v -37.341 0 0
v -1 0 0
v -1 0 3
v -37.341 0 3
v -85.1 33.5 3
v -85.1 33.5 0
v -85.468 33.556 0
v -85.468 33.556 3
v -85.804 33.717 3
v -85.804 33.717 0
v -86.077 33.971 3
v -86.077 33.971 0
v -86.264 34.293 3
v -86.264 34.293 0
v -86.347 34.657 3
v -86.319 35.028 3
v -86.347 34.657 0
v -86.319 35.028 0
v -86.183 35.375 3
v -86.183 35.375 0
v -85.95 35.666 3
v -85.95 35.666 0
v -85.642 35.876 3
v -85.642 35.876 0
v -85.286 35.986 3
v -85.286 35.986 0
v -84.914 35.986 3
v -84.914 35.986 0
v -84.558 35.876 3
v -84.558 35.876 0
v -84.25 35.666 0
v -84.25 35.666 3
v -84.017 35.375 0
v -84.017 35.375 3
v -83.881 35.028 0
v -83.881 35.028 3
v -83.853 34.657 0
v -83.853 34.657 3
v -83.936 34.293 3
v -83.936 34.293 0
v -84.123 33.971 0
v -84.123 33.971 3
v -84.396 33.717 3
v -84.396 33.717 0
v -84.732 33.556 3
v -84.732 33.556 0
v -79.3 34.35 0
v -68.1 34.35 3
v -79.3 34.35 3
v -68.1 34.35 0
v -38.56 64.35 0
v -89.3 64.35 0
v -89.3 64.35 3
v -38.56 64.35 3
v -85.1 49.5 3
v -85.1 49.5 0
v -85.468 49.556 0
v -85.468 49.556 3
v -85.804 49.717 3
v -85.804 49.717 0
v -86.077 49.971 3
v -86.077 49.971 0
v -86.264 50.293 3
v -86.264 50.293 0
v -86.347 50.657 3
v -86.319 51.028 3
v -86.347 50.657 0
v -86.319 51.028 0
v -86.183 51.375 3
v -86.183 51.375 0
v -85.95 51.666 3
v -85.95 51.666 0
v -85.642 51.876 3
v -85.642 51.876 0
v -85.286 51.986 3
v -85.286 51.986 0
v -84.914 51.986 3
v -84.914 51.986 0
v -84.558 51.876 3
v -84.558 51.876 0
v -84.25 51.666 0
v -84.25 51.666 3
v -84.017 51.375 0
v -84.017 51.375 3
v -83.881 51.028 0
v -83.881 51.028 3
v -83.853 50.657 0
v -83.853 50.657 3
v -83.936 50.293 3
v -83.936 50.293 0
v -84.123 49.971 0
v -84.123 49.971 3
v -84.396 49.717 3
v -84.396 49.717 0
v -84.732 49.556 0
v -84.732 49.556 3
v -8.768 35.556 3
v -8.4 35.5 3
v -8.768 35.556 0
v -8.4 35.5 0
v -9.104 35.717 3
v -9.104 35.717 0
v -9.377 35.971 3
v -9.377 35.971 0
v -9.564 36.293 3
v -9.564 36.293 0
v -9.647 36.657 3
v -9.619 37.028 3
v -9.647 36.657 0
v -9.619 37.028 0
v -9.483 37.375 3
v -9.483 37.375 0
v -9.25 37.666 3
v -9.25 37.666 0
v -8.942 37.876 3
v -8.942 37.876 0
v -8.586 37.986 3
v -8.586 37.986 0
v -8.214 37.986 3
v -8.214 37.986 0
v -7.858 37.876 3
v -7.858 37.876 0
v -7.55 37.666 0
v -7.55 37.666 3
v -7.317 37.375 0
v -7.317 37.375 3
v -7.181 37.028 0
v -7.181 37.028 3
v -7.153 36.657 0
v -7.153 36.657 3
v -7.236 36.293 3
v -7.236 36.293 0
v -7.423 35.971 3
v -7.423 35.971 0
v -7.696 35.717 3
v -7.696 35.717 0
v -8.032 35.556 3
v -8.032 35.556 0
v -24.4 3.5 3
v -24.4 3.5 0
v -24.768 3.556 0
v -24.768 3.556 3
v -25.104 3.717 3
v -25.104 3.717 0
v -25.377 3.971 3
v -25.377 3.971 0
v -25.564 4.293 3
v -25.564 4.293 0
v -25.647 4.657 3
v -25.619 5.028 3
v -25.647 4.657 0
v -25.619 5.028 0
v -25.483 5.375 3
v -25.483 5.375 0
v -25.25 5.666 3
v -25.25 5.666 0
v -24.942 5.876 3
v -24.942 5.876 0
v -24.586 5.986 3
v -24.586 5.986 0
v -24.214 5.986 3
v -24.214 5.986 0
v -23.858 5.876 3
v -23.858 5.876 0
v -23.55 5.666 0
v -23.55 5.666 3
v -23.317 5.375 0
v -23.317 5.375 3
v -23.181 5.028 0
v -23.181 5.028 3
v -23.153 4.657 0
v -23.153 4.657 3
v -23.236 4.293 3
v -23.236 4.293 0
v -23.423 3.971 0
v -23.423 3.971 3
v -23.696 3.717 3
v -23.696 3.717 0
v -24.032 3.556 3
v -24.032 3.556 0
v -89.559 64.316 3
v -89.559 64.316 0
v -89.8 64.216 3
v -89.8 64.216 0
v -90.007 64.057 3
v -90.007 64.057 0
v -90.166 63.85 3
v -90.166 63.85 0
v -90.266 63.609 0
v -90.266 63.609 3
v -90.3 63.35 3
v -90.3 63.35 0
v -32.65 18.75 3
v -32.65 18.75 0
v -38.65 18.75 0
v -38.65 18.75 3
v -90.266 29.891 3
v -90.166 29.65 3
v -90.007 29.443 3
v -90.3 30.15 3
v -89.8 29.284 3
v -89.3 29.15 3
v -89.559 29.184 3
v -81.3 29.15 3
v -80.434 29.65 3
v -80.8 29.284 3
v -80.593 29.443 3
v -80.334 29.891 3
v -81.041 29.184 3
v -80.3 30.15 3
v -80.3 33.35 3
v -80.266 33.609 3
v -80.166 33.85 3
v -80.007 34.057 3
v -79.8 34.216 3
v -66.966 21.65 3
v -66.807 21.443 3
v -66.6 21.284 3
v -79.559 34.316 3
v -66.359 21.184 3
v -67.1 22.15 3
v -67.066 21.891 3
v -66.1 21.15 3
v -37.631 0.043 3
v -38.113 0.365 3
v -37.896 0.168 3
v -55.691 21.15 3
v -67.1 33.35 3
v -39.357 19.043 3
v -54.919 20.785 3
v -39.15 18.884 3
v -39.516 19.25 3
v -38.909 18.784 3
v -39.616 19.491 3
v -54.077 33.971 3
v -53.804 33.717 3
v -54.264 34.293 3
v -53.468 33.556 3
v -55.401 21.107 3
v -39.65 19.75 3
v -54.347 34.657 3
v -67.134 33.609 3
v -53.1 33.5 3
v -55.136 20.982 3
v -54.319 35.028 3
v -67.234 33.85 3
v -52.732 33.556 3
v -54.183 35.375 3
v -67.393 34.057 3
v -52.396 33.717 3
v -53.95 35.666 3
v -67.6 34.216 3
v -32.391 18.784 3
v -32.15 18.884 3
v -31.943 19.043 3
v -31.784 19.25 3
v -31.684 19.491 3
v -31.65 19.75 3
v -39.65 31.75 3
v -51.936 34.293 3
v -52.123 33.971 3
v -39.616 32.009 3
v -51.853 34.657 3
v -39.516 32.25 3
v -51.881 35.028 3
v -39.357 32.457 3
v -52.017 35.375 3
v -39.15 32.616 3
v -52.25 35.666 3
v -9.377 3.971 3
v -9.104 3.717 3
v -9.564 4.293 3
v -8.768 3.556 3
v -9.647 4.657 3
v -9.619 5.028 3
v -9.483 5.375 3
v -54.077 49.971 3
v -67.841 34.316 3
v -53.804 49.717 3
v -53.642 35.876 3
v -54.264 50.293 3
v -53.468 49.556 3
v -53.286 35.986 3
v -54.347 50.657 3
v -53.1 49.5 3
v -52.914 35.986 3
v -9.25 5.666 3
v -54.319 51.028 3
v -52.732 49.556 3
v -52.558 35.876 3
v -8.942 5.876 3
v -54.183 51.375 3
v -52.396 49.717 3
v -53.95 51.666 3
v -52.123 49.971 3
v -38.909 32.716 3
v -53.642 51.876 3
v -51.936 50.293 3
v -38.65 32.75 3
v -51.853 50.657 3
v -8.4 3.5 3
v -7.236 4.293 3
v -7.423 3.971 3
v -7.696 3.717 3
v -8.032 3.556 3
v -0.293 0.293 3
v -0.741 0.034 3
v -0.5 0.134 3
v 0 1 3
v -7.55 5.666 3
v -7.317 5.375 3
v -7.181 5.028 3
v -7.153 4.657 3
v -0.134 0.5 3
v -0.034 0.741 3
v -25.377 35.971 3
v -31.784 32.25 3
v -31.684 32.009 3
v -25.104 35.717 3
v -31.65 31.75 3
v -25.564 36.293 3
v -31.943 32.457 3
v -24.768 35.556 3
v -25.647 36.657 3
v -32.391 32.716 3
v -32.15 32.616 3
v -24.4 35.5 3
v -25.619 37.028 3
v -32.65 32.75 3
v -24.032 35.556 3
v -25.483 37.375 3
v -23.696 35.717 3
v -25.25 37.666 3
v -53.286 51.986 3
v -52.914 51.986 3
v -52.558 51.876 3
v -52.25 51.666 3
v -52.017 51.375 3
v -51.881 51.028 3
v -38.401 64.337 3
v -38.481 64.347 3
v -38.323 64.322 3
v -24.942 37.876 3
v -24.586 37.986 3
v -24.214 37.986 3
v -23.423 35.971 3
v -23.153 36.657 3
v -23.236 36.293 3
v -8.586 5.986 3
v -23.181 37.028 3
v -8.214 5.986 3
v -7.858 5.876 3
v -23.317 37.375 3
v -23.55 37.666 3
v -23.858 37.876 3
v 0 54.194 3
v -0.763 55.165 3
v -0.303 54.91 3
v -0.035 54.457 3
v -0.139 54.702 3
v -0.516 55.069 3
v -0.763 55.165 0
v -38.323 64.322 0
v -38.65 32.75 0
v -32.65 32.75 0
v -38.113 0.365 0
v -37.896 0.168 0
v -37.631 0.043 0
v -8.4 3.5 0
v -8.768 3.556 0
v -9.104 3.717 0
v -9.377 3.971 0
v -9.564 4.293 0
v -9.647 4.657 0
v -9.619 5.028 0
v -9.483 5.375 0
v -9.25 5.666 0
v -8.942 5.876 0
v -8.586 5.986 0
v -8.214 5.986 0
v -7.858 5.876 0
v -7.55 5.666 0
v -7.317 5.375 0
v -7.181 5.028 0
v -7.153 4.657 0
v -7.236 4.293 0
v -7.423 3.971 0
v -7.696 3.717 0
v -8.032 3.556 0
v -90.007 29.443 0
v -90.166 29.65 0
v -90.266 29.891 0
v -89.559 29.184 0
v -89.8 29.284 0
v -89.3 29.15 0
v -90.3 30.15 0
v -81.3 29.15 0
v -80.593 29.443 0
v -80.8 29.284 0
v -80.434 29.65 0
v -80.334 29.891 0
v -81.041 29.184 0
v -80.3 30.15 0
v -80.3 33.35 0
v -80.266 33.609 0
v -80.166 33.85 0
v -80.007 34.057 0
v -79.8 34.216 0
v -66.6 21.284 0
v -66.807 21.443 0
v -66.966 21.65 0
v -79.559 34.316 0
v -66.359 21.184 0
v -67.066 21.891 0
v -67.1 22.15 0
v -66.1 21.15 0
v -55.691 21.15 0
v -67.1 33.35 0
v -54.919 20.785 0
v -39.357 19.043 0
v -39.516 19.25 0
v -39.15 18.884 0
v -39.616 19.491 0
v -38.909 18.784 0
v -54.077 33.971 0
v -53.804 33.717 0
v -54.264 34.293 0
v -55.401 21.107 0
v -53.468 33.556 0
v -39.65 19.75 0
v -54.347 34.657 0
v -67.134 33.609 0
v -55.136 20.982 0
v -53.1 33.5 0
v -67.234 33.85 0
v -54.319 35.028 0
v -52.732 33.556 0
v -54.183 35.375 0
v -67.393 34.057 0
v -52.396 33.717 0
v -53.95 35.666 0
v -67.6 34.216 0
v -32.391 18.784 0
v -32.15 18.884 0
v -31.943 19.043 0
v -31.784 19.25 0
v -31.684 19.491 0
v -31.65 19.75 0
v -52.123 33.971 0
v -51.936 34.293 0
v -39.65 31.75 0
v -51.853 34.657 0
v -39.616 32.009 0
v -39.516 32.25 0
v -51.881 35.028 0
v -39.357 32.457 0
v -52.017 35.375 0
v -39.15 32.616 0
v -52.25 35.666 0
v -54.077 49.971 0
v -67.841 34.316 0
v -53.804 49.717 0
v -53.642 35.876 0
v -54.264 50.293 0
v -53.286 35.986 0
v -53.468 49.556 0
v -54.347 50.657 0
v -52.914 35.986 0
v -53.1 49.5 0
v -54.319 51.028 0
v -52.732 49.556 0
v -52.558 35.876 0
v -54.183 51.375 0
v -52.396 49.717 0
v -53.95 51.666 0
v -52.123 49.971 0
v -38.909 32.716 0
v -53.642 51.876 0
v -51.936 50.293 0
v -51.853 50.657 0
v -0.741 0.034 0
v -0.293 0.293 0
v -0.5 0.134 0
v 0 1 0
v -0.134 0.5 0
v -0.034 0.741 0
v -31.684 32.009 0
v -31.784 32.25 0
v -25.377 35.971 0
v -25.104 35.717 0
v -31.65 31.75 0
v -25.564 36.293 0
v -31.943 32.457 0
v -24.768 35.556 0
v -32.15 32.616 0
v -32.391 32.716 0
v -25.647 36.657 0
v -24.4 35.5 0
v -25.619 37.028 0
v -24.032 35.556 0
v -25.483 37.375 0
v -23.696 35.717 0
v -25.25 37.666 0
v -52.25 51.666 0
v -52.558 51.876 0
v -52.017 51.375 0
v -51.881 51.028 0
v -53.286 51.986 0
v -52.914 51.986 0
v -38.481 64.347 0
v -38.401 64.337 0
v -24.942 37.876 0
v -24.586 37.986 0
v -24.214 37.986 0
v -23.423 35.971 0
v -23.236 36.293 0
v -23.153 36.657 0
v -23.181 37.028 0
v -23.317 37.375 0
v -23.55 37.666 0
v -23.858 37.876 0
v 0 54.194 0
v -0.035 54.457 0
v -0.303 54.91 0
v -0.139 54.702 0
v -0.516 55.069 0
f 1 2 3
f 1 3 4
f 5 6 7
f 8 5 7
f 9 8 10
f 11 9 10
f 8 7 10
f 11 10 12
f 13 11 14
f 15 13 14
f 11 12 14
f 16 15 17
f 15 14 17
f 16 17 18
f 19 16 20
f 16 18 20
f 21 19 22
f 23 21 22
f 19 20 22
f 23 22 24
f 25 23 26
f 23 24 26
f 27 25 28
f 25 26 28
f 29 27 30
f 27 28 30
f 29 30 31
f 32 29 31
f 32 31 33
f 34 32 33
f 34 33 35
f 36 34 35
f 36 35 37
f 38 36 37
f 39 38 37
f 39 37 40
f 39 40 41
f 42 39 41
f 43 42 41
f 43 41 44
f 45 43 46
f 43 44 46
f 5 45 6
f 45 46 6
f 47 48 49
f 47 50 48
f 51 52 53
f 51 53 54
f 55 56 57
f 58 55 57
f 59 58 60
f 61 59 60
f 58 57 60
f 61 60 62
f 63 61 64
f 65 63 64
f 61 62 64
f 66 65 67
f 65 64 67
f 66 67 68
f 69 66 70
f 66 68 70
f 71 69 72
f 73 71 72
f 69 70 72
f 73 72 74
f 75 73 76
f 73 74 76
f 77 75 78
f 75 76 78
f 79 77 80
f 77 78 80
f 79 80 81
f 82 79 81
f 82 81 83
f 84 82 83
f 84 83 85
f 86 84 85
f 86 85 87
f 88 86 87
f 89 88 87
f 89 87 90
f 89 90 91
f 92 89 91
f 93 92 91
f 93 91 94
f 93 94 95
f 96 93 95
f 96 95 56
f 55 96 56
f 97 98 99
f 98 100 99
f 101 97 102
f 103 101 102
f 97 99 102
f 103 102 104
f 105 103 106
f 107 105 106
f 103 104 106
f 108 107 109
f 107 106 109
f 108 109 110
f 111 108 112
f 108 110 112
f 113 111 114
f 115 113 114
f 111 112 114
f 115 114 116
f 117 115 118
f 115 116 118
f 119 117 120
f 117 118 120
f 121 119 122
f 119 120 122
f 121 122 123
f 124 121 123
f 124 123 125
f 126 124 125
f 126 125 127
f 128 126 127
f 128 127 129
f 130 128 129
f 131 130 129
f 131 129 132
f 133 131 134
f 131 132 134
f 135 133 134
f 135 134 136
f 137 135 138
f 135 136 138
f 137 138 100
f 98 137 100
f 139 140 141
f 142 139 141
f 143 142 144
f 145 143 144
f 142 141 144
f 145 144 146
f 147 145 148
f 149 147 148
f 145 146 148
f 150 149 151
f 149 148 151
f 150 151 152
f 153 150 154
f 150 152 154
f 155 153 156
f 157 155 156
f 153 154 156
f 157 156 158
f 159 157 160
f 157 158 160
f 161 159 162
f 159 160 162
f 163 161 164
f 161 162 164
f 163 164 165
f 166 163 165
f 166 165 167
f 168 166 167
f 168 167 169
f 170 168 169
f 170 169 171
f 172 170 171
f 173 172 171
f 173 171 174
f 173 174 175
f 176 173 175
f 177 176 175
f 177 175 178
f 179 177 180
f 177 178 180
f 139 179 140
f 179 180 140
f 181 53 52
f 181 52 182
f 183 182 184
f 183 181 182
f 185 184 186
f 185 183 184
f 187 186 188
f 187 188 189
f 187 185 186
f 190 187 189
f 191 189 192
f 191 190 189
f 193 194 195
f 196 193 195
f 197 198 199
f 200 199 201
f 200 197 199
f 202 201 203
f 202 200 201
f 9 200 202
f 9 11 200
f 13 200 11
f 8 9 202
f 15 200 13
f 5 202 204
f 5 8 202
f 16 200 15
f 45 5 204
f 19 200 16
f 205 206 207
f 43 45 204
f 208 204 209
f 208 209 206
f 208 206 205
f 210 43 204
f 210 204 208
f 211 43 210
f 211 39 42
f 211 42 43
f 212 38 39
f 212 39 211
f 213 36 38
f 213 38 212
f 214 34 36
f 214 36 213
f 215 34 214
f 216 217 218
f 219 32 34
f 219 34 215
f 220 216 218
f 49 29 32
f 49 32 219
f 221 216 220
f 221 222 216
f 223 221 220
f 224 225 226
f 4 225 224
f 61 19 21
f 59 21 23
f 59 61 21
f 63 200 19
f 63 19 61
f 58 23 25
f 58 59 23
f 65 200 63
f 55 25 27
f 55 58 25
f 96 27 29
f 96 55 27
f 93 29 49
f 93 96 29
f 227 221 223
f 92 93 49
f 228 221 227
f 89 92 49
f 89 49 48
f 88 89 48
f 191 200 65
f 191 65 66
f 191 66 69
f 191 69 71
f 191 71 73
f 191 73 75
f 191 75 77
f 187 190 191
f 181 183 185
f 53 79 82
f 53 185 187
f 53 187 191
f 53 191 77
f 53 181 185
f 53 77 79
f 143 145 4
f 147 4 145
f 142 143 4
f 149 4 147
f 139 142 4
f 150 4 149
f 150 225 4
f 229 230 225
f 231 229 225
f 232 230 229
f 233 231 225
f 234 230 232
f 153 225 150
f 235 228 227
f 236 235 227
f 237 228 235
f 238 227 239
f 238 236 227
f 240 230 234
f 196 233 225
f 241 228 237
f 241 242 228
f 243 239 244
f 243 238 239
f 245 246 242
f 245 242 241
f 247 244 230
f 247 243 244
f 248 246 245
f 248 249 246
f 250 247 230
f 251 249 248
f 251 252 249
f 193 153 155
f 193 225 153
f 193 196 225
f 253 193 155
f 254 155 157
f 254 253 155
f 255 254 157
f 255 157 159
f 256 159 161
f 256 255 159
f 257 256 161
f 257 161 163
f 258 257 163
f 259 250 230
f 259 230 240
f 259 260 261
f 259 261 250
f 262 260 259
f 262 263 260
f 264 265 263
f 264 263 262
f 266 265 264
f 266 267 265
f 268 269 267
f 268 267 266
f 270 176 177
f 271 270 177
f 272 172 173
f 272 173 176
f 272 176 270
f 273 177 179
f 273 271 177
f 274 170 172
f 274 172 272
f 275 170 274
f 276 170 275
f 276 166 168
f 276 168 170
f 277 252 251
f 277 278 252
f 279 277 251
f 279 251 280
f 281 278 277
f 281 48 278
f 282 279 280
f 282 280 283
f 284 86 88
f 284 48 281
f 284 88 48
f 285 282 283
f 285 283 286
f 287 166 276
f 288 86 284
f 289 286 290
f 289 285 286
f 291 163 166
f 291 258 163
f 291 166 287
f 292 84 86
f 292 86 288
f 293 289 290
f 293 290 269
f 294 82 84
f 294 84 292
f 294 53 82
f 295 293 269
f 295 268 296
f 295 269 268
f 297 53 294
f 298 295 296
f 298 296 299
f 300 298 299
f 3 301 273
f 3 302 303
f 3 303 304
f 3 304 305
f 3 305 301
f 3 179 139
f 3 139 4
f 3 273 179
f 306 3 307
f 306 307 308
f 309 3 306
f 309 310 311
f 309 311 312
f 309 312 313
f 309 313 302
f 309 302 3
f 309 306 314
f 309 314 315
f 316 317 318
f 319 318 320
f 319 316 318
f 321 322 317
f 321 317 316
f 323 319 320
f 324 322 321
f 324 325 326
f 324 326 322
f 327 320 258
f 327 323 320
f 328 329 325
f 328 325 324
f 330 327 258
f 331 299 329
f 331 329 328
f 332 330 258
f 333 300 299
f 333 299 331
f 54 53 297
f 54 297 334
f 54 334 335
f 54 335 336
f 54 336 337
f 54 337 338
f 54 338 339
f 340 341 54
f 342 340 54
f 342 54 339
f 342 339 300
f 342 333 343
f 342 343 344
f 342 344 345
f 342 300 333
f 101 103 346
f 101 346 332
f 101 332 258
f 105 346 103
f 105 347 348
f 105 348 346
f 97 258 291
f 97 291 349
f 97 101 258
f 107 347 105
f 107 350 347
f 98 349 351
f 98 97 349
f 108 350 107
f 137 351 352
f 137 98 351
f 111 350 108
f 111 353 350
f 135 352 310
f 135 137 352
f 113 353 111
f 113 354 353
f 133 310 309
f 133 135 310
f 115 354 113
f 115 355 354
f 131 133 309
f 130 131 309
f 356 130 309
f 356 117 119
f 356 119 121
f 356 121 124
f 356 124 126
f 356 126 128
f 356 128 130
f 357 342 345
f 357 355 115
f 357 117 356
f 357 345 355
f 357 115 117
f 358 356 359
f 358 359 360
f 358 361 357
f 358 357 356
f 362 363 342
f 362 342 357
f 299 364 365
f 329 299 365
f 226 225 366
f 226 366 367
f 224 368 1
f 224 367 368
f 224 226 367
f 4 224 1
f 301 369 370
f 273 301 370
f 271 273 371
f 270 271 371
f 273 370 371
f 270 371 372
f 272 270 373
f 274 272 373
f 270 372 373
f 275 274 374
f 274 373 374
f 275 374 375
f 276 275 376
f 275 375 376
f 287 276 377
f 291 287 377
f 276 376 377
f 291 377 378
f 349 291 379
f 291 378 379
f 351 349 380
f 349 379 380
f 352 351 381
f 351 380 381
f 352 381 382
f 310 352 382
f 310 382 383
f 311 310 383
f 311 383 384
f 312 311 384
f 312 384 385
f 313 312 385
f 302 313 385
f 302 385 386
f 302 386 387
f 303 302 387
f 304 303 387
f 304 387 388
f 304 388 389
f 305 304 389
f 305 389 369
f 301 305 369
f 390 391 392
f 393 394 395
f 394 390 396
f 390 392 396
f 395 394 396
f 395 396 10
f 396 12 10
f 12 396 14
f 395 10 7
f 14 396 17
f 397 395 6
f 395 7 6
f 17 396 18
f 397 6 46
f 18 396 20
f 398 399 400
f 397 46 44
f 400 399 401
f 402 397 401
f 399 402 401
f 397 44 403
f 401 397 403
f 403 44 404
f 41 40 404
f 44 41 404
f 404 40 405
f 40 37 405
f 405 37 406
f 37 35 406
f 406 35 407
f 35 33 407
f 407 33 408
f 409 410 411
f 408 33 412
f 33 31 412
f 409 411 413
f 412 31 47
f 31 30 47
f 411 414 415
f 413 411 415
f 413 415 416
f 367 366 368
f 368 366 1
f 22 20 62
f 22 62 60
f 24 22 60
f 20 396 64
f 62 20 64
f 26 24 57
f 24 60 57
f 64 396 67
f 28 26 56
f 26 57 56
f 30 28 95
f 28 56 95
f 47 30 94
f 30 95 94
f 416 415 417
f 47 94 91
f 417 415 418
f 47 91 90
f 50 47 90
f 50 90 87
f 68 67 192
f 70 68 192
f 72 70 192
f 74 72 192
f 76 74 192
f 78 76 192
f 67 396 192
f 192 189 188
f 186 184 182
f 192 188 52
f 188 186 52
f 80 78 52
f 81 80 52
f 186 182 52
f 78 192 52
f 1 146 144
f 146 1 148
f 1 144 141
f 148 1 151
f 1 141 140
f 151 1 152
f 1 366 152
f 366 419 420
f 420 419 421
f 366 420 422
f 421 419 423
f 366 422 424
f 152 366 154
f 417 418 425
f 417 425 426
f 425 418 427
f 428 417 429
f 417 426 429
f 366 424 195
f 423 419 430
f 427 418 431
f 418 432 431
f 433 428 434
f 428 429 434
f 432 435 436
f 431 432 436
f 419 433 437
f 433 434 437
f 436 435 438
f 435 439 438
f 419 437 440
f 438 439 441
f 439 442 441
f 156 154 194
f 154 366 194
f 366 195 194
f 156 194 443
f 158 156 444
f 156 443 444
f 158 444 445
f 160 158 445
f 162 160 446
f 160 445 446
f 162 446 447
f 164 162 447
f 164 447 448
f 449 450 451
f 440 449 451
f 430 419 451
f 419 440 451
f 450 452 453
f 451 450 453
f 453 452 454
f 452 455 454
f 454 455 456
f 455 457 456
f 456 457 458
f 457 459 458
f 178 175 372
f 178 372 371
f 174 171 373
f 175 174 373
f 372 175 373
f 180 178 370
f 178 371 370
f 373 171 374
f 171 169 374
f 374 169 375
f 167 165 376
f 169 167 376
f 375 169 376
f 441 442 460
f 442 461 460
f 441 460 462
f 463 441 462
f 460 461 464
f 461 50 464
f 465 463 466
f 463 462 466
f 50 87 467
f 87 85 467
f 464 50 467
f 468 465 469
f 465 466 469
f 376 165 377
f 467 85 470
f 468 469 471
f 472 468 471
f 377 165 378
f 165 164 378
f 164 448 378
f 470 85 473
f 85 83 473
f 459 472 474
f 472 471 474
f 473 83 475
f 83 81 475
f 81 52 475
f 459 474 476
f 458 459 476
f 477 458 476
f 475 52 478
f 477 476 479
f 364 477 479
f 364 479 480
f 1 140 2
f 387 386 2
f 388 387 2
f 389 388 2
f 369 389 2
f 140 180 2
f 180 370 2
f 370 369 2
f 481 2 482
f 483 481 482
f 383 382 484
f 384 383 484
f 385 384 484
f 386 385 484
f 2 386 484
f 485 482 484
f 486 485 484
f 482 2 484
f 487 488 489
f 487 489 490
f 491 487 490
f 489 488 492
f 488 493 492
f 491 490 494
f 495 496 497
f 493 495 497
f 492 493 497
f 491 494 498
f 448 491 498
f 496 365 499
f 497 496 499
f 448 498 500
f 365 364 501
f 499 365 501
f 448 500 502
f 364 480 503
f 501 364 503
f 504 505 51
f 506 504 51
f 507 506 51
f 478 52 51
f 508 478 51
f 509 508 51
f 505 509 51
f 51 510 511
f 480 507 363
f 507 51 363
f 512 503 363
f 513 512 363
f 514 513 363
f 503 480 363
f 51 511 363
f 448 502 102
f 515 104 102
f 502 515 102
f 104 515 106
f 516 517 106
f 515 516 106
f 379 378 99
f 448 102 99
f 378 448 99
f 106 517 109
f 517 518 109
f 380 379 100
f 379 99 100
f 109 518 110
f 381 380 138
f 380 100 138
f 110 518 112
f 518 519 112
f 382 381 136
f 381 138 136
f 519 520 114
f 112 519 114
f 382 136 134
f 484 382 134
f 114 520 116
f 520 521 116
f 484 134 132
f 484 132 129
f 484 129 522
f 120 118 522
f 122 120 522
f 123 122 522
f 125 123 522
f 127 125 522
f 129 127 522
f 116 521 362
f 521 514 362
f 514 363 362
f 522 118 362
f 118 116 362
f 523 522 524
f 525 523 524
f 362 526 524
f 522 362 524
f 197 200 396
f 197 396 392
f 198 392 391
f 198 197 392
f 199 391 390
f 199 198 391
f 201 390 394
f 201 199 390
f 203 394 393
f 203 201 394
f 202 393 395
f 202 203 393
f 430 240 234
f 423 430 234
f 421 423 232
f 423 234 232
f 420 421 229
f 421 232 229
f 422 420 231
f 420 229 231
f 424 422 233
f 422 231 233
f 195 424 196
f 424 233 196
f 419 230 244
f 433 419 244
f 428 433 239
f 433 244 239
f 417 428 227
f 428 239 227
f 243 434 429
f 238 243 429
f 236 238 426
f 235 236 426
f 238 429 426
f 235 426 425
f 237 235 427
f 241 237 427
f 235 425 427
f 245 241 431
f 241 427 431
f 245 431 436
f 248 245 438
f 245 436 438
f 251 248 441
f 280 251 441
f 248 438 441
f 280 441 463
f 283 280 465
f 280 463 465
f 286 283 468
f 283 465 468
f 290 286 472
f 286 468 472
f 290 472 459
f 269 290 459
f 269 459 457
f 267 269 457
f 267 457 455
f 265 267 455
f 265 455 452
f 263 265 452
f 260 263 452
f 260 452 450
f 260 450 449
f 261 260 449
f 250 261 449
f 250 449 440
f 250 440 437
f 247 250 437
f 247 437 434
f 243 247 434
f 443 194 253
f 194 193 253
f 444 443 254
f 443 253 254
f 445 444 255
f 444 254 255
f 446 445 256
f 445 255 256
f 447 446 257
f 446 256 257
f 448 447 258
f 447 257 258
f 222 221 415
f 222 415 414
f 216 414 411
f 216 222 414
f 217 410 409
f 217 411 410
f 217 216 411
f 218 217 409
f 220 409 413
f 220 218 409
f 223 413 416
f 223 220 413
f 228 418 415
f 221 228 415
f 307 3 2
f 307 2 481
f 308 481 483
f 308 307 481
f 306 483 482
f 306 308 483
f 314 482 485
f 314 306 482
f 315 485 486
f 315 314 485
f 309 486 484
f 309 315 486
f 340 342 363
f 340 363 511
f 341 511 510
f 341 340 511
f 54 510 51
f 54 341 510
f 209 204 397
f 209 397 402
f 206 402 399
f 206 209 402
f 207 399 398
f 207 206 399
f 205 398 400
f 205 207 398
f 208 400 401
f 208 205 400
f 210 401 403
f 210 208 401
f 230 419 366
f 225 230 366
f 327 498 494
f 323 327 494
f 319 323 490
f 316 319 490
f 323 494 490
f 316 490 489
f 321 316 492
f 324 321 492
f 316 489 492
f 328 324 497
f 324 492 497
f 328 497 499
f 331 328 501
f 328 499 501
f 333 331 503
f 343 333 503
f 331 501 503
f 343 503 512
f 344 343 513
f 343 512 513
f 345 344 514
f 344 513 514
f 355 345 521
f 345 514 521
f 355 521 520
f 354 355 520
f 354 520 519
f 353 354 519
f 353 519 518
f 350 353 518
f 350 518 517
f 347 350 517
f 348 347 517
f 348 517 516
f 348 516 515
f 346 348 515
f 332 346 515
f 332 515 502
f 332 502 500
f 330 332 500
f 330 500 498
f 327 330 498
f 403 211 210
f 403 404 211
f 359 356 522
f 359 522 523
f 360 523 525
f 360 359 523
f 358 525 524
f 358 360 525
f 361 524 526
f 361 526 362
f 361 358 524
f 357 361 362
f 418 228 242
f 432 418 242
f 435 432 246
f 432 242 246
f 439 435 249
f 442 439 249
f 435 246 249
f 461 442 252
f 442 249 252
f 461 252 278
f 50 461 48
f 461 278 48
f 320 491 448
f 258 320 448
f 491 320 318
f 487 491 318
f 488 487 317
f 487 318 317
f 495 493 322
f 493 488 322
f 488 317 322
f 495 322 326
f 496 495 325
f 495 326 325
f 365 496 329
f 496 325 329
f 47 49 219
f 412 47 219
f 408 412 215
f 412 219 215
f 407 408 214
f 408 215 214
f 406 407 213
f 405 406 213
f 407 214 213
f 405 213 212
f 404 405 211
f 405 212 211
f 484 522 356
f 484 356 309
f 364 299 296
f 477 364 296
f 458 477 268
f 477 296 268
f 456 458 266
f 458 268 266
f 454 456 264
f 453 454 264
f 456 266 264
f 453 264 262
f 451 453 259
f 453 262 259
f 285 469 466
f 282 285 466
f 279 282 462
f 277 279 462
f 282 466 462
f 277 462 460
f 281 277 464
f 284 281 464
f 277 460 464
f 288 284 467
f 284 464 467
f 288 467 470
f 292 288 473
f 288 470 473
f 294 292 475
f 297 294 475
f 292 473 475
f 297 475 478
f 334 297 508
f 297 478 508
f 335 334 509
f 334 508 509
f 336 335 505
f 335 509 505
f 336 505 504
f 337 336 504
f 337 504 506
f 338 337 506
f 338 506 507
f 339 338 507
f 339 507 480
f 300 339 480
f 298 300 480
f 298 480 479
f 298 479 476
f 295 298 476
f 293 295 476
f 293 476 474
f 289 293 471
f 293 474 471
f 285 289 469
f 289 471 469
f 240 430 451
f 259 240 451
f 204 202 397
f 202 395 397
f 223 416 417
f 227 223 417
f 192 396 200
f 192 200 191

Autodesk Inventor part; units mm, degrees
ref_plane "YZ Plane" through (0, 0, 0) normal (1, 0, 0) x (0, 1, 0)
ref_plane "XZ Plane" through (0, 0, 0) normal (0, 1, 0) x (-1, 0, 0)
ref_plane "XY Plane" through (0, 0, 0) normal (0, 0, 1) x (1, 0, 0)
sketch "スケッチ1" plane through (0, 0, 0) normal (0, 0, 1) x (1, 0, 0)
  line L0 (0, 0) -> (-90.3, 0)
  line L1 (-90.3, 0) -> (-90.3, 64.35)
  line L2 (-90.3, 64.35) -> (0, 64.35)
  line L3 (0, 64.35) -> (0, 0)
  line L4 (-90.3, 21.15) -> (0, 21.15)
  line L5 (-55.219, 21.15) -> (-37.813, 0)
  line L6 (-90.3, 29.15) -> (0, 29.15)
  line L7 (-80.3, 29.15) -> (-67.1, 29.15)
  line L8 (-67.1, 29.15) -> (-67.1, 34.35)
  line L9 (-67.1, 34.35) -> (-80.3, 34.35)
  line L10 (-80.3, 34.35) -> (-80.3, 29.15)
  line L11 (-67.1, 29.15) -> (-67.1, 21.15)
  line L12 (-38.44, 64.35) -> (0, 54.9793)
  dimension "d0" = 90.3
  dimension "d1" = 64.35
  dimension "d2" = 21.15
  dimension "d3" = 55.219
  dimension "d4" = 37.813
  dimension "d5" = 35.2
  dimension "d6" = 10
  dimension "d7" = 5.2
  dimension "d8" = 13.2
  dimension "d9" = 166.3
  dimension "d10" = 51.86
extrude "押し出し1" add sketch "スケッチ1" along normal blind 3 contours L0 L5 L4 L3 | L4 L11 L6 L3 | L6 L8 L9 L10 L1 L2 L12 L3
sketch "スケッチ2" plane through (0, 0, 3) normal (0, 0, 1) x (1, 0, 0)
  line L0 (-85.1, 34.75) -> (-53.1, 34.75)
  line L1 (-53.1, 34.75) -> (-53.1, 50.75)
  line L2 (-53.1, 50.75) -> (-85.1, 50.75)
  line L3 (-85.1, 50.75) -> (-85.1, 34.75)
  line L4 (-90.3, 29.15) -> (-80.3, 29.15) projected
  line L5 (-90.3, 64.35) -> (-90.3, 29.15) projected
  line L6 (-8.4, 4.75) -> (-24.4, 4.75)
  line L7 (-24.4, 4.75) -> (-24.4, 36.75)
  line L8 (-24.4, 36.75) -> (-8.4, 36.75)
  line L9 (-8.4, 36.75) -> (-8.4, 4.75)
  line L10 (0, 0) -> (0, 54.9793) projected
  line L11 (-37.813, 0) -> (0, 0) projected
  dimension "d13" = 5.6
  dimension "d14" = 5.2
  dimension "d15" = 16
  dimension "d16" = 32
  dimension "d17" = 8.4
  dimension "d18" = 4.75
  dimension "d19" = 16
  dimension "d20" = 32
hole "穴1" at (-85.1, 50.75, 3) at (-85.1, 34.75, 3) at (-53.1, 34.75, 3) at (-53.1, 50.75, 3) at (-24.4, 4.75, 3) at (-8.4, 4.75, 3) at (-8.4, 36.75, 3) at (-24.4, 36.75, 3) direction (0, 0, -1) diameter 2.5 end through all
fillet "フィレット1" radius 1 11 edges at (0, 0, 1.5) (0, 54.9793, 1.5) (-90.3, 64.35, 1.5) (-90.3, 29.15, 1.5) (-80.3, 29.15, 1.5) (-80.3, 34.35, 1.5) (-67.1, 34.35, 1.5) (-67.1, 21.15, 1.5) (-55.219, 21.15, 1.5) (-37.813, 0, 1.5) (-38.44, 64.35, 1.5)
sketch "スケッチ3" plane through (0, 0, 0) normal (0, 0, -1) x (-1, 0, 0)
  line L0 (31.65, 18.75) -> (39.65, 18.75)
  line L1 (39.65, 18.75) -> (39.65, 32.75)
  line L2 (39.65, 32.75) -> (31.65, 32.75)
  line L3 (31.65, 32.75) -> (31.65, 18.75)
  circle A0 centre (24.4, 4.75) radius 1.25 projected
  circle A1 centre (24.4, 36.75) radius 1.25 projected
  point P0 (0, 0)
  dimension "d29" = 14
  dimension "d30" = 14
  dimension "d31" = 8
  dimension "d32" = 6
extrude "押し出し2" cut sketch "スケッチ3" against normal blind 10 contours L3 L2 L1 L0
fillet "フィレット2" radius 1 4 edges at (-31.65, 18.75, 1.5) (-31.65, 32.75, 1.5) (-39.65, 32.75, 1.5) (-39.65, 18.75, 1.5)
equation "\"BendRadius\" = Thickness"
equation "\"BendReliefWidth\" = Thickness"
equation "\"BendReliefDepth\" = 0.5 * Thickness"
equation "\"CornerReliefSize\" = 4 * Thickness"
equation "\"MinimumRemnant\" = 2 * Thickness"
equation "\"TransitionRadius\" = BendRadius"
equation "\"JacobiRadiusSize\" = BendRadius"
equation "\"GapSize\" = Thickness"
equation "\"Thickness\" = 3.048"
properties part number "connectplate1" material "アルミニウム 6061"
